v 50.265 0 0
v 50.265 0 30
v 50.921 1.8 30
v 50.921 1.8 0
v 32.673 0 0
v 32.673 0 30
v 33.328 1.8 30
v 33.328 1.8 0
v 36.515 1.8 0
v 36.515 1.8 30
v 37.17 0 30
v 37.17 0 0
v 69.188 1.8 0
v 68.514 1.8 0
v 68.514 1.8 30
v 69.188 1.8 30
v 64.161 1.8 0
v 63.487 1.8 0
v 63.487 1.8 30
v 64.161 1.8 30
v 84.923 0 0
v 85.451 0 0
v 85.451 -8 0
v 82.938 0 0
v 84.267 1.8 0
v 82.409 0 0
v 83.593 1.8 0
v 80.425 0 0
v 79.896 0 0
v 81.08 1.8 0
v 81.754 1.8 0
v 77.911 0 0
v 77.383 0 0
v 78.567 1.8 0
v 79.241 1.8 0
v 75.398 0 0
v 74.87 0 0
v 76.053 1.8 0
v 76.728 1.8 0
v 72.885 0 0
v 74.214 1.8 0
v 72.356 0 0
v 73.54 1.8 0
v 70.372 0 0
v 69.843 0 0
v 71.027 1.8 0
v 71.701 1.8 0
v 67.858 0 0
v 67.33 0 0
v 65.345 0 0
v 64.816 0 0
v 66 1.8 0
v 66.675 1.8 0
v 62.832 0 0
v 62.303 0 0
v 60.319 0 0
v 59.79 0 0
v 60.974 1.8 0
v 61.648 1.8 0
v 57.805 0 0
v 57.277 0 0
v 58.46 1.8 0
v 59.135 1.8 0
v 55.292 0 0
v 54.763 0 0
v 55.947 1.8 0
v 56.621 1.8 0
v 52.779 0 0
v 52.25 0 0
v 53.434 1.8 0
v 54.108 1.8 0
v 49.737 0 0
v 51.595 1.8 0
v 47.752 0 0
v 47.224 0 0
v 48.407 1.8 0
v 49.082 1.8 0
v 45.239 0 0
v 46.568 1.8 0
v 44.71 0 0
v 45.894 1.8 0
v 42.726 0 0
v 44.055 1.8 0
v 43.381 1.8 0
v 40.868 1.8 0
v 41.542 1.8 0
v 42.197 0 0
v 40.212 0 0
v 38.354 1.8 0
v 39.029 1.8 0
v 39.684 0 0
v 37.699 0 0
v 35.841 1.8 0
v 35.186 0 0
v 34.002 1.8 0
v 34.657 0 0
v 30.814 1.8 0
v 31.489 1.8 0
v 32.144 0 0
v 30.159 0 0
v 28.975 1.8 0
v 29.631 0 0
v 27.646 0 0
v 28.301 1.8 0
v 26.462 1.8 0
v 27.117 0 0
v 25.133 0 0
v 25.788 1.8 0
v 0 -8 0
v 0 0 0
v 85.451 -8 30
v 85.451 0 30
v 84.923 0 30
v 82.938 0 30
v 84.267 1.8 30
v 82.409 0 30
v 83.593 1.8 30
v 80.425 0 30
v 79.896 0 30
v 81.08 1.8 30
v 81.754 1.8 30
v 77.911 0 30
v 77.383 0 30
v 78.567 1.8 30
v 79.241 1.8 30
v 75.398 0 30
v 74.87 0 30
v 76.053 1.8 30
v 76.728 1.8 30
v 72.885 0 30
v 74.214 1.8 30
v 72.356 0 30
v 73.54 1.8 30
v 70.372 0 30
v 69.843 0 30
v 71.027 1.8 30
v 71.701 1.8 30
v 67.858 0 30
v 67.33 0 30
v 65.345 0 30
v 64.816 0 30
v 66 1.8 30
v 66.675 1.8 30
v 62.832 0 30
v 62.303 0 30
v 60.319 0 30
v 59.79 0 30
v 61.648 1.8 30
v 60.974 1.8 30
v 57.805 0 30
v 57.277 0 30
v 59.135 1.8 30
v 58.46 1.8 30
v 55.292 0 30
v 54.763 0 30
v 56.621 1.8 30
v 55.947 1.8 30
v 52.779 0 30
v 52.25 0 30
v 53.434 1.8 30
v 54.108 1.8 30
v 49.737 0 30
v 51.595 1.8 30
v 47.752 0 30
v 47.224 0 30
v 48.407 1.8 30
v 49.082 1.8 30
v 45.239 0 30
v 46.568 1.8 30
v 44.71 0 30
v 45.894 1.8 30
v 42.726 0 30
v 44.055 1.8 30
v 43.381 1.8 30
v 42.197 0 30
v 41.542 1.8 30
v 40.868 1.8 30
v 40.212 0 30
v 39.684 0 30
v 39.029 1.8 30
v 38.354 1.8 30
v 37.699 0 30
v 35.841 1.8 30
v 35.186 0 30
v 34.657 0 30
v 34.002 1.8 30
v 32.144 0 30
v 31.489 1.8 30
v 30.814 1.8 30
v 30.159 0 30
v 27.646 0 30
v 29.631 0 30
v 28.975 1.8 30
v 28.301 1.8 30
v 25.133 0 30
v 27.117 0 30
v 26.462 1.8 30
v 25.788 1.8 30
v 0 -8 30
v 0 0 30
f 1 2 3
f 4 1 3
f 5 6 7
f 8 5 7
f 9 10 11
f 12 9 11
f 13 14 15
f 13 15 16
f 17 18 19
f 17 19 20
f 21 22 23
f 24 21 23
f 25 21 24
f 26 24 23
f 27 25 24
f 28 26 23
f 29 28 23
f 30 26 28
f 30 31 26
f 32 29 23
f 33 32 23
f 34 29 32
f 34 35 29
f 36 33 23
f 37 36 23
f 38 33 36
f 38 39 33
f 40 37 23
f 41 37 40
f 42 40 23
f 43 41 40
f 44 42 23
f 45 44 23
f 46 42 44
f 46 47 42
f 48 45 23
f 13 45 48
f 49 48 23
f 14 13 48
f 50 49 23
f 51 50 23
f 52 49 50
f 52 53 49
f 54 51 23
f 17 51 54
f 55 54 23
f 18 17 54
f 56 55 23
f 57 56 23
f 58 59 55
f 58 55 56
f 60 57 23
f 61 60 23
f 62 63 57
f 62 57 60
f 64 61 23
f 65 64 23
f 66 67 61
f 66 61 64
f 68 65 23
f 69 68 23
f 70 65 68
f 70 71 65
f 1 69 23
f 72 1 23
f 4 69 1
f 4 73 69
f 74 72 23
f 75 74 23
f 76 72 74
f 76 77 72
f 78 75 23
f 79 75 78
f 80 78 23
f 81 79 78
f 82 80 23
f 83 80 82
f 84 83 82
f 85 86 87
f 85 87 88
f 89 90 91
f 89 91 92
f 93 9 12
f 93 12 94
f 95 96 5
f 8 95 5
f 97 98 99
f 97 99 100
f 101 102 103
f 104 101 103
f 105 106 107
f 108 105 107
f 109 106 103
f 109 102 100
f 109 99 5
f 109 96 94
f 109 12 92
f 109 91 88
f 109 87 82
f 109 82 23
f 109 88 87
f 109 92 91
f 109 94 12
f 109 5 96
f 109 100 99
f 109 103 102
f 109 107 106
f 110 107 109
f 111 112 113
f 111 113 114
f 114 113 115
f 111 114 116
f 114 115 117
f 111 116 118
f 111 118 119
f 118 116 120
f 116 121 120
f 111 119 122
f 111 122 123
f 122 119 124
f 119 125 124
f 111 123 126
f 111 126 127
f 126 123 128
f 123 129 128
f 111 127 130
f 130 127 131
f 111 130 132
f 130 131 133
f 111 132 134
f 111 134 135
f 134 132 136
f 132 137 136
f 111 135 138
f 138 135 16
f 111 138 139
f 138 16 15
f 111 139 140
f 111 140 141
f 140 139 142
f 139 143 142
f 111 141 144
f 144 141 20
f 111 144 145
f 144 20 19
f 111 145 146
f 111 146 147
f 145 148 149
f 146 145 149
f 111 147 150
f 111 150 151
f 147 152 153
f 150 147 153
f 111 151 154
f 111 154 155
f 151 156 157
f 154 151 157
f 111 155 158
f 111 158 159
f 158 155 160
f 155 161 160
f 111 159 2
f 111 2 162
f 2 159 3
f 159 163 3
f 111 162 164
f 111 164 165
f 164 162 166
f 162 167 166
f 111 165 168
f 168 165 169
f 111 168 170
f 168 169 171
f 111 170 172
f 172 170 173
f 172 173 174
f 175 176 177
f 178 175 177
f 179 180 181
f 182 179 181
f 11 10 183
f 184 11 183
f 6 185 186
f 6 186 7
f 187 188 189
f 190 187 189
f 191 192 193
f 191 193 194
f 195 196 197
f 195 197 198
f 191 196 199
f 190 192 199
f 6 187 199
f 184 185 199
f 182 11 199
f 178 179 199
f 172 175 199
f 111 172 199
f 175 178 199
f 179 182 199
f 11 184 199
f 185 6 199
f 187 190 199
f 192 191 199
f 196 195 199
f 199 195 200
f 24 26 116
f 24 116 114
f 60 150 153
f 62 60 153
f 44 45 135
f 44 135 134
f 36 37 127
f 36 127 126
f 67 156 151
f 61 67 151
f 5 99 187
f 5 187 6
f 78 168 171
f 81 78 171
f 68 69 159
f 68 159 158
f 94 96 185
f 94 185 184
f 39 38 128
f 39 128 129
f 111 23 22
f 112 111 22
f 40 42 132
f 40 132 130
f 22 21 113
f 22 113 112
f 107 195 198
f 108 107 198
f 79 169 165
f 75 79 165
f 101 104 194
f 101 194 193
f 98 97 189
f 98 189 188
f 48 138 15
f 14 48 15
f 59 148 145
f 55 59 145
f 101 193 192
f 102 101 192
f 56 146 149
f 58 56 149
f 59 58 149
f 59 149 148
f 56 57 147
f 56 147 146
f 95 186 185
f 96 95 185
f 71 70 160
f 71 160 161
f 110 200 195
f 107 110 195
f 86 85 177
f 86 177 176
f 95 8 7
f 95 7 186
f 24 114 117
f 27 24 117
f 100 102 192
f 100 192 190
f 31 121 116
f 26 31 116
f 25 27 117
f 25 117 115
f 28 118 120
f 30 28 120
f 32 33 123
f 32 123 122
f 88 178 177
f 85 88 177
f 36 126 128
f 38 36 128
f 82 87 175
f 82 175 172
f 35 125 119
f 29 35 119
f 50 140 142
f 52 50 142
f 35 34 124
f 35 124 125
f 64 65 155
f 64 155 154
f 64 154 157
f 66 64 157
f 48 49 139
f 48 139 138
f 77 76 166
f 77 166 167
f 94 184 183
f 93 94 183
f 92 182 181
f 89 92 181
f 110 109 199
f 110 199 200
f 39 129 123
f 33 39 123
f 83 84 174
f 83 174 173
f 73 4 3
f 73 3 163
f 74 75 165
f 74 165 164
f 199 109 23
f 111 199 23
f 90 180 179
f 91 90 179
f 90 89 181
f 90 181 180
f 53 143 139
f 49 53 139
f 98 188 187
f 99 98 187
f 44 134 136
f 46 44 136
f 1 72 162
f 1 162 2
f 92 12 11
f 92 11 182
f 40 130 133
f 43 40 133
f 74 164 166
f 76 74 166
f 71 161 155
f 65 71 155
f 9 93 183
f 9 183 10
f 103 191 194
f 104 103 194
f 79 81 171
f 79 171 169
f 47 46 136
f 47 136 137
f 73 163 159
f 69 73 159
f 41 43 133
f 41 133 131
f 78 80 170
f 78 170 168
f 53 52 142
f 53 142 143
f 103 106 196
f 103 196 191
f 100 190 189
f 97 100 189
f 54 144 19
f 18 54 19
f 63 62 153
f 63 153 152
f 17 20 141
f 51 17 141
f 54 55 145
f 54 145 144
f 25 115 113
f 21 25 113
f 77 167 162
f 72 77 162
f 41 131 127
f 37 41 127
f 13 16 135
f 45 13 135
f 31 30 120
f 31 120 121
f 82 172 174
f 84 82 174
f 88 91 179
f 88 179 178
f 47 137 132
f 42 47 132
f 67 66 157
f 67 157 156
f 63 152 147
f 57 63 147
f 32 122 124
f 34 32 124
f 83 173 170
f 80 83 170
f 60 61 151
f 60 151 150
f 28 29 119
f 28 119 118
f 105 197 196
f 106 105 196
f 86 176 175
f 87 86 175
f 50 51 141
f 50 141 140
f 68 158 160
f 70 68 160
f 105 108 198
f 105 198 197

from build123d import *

# Parameters (mm, degrees)
SKETCH1_W           = 85.451320178
SKETCH1_H           = 8
EXTRUDE1_DEPTH      = 30
EXTRUDE2_DEPTH      = 30
LPATTERN1_COUNT     = 34
LPATTERN1_PITCH     = 2.513274123
SKETCH_1_W          = 24.951320178
SKETCH_1_H          = 8.70222752
CUT_EXTRUDE_1_DEPTH = 40


with BuildPart() as part:
    # Sketch1 → Extrude1 (new body)
    with BuildSketch(Plane.XY):
        with Locations((42.725660089, -4)):
            Rectangle(SKETCH1_W, SKETCH1_H)
    extrude(amount=EXTRUDE1_DEPTH)

    # Sketch2 → Extrude2 (add)
    with BuildSketch(Plane.XY.offset(30)):
        Polygon((0, 0), (0.655146422, 1.8), (1.329431108, 1.8), (1.98457753, 0), align=None)
    extrude2 = extrude(amount=-EXTRUDE2_DEPTH)

    # LPattern1: Extrude2 ×34
    with Locations(*[(i * LPATTERN1_PITCH, 0, 0) for i in range(1, LPATTERN1_COUNT)]):
        add(extrude2)

    # 草图1 → 切除-拉伸1 (cut)
    with BuildSketch(Plane.XY.offset(30)):
        with Locations((12.475660089, 4.35111376)):
            Rectangle(SKETCH_1_W, SKETCH_1_H)
    extrude(amount=-CUT_EXTRUDE_1_DEPTH, mode=Mode.SUBTRACT)


solid = part.part
